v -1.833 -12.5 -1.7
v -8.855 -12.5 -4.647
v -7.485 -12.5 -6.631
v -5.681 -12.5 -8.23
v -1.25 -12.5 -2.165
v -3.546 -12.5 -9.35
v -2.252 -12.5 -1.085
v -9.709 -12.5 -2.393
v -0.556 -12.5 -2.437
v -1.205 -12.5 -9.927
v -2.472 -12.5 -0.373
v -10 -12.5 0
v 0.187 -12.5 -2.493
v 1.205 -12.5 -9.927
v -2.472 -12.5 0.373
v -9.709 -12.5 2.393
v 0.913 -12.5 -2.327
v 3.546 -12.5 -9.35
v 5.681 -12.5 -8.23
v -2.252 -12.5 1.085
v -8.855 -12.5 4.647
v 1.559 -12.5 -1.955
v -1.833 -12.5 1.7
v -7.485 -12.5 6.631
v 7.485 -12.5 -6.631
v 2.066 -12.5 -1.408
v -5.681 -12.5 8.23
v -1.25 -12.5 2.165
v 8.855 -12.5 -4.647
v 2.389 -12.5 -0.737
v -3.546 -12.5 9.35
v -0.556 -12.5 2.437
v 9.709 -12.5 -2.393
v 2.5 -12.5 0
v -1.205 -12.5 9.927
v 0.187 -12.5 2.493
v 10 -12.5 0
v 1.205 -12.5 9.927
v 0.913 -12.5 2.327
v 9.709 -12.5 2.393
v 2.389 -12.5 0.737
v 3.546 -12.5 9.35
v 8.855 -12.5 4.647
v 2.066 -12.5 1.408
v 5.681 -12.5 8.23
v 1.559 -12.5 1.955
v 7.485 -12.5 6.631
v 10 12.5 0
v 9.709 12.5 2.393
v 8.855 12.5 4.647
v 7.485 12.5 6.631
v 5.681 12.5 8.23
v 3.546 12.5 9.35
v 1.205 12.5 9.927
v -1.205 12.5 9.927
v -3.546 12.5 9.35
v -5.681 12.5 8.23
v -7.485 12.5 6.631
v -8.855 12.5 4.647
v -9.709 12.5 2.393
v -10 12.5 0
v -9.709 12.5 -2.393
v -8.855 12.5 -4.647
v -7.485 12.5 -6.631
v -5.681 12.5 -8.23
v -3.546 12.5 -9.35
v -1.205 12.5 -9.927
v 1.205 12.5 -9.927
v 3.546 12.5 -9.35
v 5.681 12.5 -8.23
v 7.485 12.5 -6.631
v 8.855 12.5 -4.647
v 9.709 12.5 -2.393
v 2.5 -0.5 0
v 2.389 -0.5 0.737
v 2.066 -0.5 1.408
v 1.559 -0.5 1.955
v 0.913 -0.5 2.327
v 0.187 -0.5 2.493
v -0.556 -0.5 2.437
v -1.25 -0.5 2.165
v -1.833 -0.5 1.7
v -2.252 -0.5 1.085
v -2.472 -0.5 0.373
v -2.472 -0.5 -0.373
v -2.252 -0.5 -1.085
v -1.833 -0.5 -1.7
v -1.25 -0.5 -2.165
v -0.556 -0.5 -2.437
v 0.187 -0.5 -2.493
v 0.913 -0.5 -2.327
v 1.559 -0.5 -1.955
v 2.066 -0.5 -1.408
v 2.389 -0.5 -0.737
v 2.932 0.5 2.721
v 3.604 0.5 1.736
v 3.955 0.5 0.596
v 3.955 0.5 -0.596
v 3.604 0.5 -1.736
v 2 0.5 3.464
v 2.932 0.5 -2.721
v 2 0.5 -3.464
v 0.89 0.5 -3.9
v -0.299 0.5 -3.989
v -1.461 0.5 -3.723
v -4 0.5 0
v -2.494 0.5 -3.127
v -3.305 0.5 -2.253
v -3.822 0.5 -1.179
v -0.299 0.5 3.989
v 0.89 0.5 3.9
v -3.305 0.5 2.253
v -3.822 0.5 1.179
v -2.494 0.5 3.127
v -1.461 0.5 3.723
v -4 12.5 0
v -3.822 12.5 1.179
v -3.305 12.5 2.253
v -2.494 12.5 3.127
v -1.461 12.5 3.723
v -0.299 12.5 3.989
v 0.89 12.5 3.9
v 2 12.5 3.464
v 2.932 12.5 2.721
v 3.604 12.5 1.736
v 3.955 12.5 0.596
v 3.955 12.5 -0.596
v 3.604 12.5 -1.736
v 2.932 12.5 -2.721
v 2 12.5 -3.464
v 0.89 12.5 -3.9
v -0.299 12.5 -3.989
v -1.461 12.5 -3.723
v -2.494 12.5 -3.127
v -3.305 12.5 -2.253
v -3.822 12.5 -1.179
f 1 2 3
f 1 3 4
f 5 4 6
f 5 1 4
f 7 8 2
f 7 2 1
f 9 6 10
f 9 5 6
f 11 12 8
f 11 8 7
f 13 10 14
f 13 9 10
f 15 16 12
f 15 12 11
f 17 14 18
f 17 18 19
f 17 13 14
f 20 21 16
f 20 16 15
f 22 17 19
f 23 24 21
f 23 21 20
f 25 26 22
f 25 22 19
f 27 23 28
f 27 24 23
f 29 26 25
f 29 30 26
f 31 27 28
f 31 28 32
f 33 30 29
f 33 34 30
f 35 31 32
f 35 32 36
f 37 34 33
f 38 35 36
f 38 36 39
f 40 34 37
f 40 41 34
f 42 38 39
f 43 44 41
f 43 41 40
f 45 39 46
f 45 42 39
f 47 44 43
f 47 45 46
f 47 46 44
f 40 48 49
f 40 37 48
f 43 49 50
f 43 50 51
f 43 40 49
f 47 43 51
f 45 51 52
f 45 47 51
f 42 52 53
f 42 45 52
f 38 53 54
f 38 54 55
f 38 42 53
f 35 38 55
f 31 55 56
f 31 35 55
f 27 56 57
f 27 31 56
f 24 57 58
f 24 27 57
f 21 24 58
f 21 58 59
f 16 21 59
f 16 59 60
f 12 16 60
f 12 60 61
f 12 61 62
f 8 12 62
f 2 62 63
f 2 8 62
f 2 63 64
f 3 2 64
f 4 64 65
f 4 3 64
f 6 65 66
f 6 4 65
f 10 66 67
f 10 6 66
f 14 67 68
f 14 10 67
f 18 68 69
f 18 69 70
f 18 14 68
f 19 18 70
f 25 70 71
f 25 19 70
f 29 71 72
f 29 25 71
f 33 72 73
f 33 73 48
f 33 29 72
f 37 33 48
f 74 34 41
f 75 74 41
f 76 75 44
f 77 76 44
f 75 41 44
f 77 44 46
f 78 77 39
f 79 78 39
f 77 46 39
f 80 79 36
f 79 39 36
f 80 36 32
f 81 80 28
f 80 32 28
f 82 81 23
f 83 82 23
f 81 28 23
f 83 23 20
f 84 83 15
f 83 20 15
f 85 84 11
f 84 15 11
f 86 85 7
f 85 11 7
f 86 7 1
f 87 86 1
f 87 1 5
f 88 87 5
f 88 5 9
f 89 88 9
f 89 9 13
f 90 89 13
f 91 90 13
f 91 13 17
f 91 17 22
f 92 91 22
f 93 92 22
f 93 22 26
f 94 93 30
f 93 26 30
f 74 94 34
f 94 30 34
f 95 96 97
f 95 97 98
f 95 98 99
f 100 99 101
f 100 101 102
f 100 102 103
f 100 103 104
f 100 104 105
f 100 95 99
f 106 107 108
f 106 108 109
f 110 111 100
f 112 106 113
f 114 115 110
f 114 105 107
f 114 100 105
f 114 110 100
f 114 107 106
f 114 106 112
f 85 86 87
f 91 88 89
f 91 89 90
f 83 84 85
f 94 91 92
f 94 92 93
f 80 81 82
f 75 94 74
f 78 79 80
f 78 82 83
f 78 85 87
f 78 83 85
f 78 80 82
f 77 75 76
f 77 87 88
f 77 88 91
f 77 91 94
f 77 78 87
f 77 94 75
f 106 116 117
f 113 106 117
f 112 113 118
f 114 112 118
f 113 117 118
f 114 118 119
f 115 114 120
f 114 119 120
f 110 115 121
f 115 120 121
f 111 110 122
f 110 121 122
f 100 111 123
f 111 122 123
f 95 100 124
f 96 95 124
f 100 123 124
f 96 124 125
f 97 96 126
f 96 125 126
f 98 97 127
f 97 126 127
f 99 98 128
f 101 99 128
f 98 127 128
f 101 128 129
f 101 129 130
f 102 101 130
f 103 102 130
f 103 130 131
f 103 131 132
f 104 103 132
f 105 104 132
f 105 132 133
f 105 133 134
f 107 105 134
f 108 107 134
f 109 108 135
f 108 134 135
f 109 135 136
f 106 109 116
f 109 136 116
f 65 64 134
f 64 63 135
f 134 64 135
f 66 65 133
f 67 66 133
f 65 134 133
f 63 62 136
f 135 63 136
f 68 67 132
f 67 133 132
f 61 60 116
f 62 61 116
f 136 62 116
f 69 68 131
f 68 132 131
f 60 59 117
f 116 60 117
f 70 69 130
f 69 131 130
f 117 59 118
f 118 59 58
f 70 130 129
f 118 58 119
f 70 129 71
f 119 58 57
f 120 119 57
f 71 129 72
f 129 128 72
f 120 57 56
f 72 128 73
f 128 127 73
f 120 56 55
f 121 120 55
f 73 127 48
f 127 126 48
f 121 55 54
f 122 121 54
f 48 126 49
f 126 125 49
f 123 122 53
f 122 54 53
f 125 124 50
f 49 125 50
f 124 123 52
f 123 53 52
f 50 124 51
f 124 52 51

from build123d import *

# Parameters (mm, degrees)
F0_R     = 10
F1_DEPTH = 12.5
F2_R     = 2.5
F3_DEPTH = 12
F4_R     = 4
F5_DEPTH = 12


with BuildPart() as f1:
    # F0 (on Front) → F1 (new body, symmetric)
    with BuildSketch(Plane.XZ):
        Circle(F0_R)
    extrude(amount=F1_DEPTH, both=True)

    # F2 (on face) → F3 (cut)
    with BuildSketch(Plane.XZ.offset(12.5)):
        Circle(F2_R)
    extrude(amount=-F3_DEPTH, mode=Mode.SUBTRACT)

    # F4 (on face) → F5 (cut)
    with BuildSketch(Plane(origin=(0, 12.5, 0), x_dir=(-1, 0, 0), z_dir=(0, 1, 0))):
        Circle(F4_R)
    extrude(amount=-F5_DEPTH, mode=Mode.SUBTRACT)


solid = f1.part
